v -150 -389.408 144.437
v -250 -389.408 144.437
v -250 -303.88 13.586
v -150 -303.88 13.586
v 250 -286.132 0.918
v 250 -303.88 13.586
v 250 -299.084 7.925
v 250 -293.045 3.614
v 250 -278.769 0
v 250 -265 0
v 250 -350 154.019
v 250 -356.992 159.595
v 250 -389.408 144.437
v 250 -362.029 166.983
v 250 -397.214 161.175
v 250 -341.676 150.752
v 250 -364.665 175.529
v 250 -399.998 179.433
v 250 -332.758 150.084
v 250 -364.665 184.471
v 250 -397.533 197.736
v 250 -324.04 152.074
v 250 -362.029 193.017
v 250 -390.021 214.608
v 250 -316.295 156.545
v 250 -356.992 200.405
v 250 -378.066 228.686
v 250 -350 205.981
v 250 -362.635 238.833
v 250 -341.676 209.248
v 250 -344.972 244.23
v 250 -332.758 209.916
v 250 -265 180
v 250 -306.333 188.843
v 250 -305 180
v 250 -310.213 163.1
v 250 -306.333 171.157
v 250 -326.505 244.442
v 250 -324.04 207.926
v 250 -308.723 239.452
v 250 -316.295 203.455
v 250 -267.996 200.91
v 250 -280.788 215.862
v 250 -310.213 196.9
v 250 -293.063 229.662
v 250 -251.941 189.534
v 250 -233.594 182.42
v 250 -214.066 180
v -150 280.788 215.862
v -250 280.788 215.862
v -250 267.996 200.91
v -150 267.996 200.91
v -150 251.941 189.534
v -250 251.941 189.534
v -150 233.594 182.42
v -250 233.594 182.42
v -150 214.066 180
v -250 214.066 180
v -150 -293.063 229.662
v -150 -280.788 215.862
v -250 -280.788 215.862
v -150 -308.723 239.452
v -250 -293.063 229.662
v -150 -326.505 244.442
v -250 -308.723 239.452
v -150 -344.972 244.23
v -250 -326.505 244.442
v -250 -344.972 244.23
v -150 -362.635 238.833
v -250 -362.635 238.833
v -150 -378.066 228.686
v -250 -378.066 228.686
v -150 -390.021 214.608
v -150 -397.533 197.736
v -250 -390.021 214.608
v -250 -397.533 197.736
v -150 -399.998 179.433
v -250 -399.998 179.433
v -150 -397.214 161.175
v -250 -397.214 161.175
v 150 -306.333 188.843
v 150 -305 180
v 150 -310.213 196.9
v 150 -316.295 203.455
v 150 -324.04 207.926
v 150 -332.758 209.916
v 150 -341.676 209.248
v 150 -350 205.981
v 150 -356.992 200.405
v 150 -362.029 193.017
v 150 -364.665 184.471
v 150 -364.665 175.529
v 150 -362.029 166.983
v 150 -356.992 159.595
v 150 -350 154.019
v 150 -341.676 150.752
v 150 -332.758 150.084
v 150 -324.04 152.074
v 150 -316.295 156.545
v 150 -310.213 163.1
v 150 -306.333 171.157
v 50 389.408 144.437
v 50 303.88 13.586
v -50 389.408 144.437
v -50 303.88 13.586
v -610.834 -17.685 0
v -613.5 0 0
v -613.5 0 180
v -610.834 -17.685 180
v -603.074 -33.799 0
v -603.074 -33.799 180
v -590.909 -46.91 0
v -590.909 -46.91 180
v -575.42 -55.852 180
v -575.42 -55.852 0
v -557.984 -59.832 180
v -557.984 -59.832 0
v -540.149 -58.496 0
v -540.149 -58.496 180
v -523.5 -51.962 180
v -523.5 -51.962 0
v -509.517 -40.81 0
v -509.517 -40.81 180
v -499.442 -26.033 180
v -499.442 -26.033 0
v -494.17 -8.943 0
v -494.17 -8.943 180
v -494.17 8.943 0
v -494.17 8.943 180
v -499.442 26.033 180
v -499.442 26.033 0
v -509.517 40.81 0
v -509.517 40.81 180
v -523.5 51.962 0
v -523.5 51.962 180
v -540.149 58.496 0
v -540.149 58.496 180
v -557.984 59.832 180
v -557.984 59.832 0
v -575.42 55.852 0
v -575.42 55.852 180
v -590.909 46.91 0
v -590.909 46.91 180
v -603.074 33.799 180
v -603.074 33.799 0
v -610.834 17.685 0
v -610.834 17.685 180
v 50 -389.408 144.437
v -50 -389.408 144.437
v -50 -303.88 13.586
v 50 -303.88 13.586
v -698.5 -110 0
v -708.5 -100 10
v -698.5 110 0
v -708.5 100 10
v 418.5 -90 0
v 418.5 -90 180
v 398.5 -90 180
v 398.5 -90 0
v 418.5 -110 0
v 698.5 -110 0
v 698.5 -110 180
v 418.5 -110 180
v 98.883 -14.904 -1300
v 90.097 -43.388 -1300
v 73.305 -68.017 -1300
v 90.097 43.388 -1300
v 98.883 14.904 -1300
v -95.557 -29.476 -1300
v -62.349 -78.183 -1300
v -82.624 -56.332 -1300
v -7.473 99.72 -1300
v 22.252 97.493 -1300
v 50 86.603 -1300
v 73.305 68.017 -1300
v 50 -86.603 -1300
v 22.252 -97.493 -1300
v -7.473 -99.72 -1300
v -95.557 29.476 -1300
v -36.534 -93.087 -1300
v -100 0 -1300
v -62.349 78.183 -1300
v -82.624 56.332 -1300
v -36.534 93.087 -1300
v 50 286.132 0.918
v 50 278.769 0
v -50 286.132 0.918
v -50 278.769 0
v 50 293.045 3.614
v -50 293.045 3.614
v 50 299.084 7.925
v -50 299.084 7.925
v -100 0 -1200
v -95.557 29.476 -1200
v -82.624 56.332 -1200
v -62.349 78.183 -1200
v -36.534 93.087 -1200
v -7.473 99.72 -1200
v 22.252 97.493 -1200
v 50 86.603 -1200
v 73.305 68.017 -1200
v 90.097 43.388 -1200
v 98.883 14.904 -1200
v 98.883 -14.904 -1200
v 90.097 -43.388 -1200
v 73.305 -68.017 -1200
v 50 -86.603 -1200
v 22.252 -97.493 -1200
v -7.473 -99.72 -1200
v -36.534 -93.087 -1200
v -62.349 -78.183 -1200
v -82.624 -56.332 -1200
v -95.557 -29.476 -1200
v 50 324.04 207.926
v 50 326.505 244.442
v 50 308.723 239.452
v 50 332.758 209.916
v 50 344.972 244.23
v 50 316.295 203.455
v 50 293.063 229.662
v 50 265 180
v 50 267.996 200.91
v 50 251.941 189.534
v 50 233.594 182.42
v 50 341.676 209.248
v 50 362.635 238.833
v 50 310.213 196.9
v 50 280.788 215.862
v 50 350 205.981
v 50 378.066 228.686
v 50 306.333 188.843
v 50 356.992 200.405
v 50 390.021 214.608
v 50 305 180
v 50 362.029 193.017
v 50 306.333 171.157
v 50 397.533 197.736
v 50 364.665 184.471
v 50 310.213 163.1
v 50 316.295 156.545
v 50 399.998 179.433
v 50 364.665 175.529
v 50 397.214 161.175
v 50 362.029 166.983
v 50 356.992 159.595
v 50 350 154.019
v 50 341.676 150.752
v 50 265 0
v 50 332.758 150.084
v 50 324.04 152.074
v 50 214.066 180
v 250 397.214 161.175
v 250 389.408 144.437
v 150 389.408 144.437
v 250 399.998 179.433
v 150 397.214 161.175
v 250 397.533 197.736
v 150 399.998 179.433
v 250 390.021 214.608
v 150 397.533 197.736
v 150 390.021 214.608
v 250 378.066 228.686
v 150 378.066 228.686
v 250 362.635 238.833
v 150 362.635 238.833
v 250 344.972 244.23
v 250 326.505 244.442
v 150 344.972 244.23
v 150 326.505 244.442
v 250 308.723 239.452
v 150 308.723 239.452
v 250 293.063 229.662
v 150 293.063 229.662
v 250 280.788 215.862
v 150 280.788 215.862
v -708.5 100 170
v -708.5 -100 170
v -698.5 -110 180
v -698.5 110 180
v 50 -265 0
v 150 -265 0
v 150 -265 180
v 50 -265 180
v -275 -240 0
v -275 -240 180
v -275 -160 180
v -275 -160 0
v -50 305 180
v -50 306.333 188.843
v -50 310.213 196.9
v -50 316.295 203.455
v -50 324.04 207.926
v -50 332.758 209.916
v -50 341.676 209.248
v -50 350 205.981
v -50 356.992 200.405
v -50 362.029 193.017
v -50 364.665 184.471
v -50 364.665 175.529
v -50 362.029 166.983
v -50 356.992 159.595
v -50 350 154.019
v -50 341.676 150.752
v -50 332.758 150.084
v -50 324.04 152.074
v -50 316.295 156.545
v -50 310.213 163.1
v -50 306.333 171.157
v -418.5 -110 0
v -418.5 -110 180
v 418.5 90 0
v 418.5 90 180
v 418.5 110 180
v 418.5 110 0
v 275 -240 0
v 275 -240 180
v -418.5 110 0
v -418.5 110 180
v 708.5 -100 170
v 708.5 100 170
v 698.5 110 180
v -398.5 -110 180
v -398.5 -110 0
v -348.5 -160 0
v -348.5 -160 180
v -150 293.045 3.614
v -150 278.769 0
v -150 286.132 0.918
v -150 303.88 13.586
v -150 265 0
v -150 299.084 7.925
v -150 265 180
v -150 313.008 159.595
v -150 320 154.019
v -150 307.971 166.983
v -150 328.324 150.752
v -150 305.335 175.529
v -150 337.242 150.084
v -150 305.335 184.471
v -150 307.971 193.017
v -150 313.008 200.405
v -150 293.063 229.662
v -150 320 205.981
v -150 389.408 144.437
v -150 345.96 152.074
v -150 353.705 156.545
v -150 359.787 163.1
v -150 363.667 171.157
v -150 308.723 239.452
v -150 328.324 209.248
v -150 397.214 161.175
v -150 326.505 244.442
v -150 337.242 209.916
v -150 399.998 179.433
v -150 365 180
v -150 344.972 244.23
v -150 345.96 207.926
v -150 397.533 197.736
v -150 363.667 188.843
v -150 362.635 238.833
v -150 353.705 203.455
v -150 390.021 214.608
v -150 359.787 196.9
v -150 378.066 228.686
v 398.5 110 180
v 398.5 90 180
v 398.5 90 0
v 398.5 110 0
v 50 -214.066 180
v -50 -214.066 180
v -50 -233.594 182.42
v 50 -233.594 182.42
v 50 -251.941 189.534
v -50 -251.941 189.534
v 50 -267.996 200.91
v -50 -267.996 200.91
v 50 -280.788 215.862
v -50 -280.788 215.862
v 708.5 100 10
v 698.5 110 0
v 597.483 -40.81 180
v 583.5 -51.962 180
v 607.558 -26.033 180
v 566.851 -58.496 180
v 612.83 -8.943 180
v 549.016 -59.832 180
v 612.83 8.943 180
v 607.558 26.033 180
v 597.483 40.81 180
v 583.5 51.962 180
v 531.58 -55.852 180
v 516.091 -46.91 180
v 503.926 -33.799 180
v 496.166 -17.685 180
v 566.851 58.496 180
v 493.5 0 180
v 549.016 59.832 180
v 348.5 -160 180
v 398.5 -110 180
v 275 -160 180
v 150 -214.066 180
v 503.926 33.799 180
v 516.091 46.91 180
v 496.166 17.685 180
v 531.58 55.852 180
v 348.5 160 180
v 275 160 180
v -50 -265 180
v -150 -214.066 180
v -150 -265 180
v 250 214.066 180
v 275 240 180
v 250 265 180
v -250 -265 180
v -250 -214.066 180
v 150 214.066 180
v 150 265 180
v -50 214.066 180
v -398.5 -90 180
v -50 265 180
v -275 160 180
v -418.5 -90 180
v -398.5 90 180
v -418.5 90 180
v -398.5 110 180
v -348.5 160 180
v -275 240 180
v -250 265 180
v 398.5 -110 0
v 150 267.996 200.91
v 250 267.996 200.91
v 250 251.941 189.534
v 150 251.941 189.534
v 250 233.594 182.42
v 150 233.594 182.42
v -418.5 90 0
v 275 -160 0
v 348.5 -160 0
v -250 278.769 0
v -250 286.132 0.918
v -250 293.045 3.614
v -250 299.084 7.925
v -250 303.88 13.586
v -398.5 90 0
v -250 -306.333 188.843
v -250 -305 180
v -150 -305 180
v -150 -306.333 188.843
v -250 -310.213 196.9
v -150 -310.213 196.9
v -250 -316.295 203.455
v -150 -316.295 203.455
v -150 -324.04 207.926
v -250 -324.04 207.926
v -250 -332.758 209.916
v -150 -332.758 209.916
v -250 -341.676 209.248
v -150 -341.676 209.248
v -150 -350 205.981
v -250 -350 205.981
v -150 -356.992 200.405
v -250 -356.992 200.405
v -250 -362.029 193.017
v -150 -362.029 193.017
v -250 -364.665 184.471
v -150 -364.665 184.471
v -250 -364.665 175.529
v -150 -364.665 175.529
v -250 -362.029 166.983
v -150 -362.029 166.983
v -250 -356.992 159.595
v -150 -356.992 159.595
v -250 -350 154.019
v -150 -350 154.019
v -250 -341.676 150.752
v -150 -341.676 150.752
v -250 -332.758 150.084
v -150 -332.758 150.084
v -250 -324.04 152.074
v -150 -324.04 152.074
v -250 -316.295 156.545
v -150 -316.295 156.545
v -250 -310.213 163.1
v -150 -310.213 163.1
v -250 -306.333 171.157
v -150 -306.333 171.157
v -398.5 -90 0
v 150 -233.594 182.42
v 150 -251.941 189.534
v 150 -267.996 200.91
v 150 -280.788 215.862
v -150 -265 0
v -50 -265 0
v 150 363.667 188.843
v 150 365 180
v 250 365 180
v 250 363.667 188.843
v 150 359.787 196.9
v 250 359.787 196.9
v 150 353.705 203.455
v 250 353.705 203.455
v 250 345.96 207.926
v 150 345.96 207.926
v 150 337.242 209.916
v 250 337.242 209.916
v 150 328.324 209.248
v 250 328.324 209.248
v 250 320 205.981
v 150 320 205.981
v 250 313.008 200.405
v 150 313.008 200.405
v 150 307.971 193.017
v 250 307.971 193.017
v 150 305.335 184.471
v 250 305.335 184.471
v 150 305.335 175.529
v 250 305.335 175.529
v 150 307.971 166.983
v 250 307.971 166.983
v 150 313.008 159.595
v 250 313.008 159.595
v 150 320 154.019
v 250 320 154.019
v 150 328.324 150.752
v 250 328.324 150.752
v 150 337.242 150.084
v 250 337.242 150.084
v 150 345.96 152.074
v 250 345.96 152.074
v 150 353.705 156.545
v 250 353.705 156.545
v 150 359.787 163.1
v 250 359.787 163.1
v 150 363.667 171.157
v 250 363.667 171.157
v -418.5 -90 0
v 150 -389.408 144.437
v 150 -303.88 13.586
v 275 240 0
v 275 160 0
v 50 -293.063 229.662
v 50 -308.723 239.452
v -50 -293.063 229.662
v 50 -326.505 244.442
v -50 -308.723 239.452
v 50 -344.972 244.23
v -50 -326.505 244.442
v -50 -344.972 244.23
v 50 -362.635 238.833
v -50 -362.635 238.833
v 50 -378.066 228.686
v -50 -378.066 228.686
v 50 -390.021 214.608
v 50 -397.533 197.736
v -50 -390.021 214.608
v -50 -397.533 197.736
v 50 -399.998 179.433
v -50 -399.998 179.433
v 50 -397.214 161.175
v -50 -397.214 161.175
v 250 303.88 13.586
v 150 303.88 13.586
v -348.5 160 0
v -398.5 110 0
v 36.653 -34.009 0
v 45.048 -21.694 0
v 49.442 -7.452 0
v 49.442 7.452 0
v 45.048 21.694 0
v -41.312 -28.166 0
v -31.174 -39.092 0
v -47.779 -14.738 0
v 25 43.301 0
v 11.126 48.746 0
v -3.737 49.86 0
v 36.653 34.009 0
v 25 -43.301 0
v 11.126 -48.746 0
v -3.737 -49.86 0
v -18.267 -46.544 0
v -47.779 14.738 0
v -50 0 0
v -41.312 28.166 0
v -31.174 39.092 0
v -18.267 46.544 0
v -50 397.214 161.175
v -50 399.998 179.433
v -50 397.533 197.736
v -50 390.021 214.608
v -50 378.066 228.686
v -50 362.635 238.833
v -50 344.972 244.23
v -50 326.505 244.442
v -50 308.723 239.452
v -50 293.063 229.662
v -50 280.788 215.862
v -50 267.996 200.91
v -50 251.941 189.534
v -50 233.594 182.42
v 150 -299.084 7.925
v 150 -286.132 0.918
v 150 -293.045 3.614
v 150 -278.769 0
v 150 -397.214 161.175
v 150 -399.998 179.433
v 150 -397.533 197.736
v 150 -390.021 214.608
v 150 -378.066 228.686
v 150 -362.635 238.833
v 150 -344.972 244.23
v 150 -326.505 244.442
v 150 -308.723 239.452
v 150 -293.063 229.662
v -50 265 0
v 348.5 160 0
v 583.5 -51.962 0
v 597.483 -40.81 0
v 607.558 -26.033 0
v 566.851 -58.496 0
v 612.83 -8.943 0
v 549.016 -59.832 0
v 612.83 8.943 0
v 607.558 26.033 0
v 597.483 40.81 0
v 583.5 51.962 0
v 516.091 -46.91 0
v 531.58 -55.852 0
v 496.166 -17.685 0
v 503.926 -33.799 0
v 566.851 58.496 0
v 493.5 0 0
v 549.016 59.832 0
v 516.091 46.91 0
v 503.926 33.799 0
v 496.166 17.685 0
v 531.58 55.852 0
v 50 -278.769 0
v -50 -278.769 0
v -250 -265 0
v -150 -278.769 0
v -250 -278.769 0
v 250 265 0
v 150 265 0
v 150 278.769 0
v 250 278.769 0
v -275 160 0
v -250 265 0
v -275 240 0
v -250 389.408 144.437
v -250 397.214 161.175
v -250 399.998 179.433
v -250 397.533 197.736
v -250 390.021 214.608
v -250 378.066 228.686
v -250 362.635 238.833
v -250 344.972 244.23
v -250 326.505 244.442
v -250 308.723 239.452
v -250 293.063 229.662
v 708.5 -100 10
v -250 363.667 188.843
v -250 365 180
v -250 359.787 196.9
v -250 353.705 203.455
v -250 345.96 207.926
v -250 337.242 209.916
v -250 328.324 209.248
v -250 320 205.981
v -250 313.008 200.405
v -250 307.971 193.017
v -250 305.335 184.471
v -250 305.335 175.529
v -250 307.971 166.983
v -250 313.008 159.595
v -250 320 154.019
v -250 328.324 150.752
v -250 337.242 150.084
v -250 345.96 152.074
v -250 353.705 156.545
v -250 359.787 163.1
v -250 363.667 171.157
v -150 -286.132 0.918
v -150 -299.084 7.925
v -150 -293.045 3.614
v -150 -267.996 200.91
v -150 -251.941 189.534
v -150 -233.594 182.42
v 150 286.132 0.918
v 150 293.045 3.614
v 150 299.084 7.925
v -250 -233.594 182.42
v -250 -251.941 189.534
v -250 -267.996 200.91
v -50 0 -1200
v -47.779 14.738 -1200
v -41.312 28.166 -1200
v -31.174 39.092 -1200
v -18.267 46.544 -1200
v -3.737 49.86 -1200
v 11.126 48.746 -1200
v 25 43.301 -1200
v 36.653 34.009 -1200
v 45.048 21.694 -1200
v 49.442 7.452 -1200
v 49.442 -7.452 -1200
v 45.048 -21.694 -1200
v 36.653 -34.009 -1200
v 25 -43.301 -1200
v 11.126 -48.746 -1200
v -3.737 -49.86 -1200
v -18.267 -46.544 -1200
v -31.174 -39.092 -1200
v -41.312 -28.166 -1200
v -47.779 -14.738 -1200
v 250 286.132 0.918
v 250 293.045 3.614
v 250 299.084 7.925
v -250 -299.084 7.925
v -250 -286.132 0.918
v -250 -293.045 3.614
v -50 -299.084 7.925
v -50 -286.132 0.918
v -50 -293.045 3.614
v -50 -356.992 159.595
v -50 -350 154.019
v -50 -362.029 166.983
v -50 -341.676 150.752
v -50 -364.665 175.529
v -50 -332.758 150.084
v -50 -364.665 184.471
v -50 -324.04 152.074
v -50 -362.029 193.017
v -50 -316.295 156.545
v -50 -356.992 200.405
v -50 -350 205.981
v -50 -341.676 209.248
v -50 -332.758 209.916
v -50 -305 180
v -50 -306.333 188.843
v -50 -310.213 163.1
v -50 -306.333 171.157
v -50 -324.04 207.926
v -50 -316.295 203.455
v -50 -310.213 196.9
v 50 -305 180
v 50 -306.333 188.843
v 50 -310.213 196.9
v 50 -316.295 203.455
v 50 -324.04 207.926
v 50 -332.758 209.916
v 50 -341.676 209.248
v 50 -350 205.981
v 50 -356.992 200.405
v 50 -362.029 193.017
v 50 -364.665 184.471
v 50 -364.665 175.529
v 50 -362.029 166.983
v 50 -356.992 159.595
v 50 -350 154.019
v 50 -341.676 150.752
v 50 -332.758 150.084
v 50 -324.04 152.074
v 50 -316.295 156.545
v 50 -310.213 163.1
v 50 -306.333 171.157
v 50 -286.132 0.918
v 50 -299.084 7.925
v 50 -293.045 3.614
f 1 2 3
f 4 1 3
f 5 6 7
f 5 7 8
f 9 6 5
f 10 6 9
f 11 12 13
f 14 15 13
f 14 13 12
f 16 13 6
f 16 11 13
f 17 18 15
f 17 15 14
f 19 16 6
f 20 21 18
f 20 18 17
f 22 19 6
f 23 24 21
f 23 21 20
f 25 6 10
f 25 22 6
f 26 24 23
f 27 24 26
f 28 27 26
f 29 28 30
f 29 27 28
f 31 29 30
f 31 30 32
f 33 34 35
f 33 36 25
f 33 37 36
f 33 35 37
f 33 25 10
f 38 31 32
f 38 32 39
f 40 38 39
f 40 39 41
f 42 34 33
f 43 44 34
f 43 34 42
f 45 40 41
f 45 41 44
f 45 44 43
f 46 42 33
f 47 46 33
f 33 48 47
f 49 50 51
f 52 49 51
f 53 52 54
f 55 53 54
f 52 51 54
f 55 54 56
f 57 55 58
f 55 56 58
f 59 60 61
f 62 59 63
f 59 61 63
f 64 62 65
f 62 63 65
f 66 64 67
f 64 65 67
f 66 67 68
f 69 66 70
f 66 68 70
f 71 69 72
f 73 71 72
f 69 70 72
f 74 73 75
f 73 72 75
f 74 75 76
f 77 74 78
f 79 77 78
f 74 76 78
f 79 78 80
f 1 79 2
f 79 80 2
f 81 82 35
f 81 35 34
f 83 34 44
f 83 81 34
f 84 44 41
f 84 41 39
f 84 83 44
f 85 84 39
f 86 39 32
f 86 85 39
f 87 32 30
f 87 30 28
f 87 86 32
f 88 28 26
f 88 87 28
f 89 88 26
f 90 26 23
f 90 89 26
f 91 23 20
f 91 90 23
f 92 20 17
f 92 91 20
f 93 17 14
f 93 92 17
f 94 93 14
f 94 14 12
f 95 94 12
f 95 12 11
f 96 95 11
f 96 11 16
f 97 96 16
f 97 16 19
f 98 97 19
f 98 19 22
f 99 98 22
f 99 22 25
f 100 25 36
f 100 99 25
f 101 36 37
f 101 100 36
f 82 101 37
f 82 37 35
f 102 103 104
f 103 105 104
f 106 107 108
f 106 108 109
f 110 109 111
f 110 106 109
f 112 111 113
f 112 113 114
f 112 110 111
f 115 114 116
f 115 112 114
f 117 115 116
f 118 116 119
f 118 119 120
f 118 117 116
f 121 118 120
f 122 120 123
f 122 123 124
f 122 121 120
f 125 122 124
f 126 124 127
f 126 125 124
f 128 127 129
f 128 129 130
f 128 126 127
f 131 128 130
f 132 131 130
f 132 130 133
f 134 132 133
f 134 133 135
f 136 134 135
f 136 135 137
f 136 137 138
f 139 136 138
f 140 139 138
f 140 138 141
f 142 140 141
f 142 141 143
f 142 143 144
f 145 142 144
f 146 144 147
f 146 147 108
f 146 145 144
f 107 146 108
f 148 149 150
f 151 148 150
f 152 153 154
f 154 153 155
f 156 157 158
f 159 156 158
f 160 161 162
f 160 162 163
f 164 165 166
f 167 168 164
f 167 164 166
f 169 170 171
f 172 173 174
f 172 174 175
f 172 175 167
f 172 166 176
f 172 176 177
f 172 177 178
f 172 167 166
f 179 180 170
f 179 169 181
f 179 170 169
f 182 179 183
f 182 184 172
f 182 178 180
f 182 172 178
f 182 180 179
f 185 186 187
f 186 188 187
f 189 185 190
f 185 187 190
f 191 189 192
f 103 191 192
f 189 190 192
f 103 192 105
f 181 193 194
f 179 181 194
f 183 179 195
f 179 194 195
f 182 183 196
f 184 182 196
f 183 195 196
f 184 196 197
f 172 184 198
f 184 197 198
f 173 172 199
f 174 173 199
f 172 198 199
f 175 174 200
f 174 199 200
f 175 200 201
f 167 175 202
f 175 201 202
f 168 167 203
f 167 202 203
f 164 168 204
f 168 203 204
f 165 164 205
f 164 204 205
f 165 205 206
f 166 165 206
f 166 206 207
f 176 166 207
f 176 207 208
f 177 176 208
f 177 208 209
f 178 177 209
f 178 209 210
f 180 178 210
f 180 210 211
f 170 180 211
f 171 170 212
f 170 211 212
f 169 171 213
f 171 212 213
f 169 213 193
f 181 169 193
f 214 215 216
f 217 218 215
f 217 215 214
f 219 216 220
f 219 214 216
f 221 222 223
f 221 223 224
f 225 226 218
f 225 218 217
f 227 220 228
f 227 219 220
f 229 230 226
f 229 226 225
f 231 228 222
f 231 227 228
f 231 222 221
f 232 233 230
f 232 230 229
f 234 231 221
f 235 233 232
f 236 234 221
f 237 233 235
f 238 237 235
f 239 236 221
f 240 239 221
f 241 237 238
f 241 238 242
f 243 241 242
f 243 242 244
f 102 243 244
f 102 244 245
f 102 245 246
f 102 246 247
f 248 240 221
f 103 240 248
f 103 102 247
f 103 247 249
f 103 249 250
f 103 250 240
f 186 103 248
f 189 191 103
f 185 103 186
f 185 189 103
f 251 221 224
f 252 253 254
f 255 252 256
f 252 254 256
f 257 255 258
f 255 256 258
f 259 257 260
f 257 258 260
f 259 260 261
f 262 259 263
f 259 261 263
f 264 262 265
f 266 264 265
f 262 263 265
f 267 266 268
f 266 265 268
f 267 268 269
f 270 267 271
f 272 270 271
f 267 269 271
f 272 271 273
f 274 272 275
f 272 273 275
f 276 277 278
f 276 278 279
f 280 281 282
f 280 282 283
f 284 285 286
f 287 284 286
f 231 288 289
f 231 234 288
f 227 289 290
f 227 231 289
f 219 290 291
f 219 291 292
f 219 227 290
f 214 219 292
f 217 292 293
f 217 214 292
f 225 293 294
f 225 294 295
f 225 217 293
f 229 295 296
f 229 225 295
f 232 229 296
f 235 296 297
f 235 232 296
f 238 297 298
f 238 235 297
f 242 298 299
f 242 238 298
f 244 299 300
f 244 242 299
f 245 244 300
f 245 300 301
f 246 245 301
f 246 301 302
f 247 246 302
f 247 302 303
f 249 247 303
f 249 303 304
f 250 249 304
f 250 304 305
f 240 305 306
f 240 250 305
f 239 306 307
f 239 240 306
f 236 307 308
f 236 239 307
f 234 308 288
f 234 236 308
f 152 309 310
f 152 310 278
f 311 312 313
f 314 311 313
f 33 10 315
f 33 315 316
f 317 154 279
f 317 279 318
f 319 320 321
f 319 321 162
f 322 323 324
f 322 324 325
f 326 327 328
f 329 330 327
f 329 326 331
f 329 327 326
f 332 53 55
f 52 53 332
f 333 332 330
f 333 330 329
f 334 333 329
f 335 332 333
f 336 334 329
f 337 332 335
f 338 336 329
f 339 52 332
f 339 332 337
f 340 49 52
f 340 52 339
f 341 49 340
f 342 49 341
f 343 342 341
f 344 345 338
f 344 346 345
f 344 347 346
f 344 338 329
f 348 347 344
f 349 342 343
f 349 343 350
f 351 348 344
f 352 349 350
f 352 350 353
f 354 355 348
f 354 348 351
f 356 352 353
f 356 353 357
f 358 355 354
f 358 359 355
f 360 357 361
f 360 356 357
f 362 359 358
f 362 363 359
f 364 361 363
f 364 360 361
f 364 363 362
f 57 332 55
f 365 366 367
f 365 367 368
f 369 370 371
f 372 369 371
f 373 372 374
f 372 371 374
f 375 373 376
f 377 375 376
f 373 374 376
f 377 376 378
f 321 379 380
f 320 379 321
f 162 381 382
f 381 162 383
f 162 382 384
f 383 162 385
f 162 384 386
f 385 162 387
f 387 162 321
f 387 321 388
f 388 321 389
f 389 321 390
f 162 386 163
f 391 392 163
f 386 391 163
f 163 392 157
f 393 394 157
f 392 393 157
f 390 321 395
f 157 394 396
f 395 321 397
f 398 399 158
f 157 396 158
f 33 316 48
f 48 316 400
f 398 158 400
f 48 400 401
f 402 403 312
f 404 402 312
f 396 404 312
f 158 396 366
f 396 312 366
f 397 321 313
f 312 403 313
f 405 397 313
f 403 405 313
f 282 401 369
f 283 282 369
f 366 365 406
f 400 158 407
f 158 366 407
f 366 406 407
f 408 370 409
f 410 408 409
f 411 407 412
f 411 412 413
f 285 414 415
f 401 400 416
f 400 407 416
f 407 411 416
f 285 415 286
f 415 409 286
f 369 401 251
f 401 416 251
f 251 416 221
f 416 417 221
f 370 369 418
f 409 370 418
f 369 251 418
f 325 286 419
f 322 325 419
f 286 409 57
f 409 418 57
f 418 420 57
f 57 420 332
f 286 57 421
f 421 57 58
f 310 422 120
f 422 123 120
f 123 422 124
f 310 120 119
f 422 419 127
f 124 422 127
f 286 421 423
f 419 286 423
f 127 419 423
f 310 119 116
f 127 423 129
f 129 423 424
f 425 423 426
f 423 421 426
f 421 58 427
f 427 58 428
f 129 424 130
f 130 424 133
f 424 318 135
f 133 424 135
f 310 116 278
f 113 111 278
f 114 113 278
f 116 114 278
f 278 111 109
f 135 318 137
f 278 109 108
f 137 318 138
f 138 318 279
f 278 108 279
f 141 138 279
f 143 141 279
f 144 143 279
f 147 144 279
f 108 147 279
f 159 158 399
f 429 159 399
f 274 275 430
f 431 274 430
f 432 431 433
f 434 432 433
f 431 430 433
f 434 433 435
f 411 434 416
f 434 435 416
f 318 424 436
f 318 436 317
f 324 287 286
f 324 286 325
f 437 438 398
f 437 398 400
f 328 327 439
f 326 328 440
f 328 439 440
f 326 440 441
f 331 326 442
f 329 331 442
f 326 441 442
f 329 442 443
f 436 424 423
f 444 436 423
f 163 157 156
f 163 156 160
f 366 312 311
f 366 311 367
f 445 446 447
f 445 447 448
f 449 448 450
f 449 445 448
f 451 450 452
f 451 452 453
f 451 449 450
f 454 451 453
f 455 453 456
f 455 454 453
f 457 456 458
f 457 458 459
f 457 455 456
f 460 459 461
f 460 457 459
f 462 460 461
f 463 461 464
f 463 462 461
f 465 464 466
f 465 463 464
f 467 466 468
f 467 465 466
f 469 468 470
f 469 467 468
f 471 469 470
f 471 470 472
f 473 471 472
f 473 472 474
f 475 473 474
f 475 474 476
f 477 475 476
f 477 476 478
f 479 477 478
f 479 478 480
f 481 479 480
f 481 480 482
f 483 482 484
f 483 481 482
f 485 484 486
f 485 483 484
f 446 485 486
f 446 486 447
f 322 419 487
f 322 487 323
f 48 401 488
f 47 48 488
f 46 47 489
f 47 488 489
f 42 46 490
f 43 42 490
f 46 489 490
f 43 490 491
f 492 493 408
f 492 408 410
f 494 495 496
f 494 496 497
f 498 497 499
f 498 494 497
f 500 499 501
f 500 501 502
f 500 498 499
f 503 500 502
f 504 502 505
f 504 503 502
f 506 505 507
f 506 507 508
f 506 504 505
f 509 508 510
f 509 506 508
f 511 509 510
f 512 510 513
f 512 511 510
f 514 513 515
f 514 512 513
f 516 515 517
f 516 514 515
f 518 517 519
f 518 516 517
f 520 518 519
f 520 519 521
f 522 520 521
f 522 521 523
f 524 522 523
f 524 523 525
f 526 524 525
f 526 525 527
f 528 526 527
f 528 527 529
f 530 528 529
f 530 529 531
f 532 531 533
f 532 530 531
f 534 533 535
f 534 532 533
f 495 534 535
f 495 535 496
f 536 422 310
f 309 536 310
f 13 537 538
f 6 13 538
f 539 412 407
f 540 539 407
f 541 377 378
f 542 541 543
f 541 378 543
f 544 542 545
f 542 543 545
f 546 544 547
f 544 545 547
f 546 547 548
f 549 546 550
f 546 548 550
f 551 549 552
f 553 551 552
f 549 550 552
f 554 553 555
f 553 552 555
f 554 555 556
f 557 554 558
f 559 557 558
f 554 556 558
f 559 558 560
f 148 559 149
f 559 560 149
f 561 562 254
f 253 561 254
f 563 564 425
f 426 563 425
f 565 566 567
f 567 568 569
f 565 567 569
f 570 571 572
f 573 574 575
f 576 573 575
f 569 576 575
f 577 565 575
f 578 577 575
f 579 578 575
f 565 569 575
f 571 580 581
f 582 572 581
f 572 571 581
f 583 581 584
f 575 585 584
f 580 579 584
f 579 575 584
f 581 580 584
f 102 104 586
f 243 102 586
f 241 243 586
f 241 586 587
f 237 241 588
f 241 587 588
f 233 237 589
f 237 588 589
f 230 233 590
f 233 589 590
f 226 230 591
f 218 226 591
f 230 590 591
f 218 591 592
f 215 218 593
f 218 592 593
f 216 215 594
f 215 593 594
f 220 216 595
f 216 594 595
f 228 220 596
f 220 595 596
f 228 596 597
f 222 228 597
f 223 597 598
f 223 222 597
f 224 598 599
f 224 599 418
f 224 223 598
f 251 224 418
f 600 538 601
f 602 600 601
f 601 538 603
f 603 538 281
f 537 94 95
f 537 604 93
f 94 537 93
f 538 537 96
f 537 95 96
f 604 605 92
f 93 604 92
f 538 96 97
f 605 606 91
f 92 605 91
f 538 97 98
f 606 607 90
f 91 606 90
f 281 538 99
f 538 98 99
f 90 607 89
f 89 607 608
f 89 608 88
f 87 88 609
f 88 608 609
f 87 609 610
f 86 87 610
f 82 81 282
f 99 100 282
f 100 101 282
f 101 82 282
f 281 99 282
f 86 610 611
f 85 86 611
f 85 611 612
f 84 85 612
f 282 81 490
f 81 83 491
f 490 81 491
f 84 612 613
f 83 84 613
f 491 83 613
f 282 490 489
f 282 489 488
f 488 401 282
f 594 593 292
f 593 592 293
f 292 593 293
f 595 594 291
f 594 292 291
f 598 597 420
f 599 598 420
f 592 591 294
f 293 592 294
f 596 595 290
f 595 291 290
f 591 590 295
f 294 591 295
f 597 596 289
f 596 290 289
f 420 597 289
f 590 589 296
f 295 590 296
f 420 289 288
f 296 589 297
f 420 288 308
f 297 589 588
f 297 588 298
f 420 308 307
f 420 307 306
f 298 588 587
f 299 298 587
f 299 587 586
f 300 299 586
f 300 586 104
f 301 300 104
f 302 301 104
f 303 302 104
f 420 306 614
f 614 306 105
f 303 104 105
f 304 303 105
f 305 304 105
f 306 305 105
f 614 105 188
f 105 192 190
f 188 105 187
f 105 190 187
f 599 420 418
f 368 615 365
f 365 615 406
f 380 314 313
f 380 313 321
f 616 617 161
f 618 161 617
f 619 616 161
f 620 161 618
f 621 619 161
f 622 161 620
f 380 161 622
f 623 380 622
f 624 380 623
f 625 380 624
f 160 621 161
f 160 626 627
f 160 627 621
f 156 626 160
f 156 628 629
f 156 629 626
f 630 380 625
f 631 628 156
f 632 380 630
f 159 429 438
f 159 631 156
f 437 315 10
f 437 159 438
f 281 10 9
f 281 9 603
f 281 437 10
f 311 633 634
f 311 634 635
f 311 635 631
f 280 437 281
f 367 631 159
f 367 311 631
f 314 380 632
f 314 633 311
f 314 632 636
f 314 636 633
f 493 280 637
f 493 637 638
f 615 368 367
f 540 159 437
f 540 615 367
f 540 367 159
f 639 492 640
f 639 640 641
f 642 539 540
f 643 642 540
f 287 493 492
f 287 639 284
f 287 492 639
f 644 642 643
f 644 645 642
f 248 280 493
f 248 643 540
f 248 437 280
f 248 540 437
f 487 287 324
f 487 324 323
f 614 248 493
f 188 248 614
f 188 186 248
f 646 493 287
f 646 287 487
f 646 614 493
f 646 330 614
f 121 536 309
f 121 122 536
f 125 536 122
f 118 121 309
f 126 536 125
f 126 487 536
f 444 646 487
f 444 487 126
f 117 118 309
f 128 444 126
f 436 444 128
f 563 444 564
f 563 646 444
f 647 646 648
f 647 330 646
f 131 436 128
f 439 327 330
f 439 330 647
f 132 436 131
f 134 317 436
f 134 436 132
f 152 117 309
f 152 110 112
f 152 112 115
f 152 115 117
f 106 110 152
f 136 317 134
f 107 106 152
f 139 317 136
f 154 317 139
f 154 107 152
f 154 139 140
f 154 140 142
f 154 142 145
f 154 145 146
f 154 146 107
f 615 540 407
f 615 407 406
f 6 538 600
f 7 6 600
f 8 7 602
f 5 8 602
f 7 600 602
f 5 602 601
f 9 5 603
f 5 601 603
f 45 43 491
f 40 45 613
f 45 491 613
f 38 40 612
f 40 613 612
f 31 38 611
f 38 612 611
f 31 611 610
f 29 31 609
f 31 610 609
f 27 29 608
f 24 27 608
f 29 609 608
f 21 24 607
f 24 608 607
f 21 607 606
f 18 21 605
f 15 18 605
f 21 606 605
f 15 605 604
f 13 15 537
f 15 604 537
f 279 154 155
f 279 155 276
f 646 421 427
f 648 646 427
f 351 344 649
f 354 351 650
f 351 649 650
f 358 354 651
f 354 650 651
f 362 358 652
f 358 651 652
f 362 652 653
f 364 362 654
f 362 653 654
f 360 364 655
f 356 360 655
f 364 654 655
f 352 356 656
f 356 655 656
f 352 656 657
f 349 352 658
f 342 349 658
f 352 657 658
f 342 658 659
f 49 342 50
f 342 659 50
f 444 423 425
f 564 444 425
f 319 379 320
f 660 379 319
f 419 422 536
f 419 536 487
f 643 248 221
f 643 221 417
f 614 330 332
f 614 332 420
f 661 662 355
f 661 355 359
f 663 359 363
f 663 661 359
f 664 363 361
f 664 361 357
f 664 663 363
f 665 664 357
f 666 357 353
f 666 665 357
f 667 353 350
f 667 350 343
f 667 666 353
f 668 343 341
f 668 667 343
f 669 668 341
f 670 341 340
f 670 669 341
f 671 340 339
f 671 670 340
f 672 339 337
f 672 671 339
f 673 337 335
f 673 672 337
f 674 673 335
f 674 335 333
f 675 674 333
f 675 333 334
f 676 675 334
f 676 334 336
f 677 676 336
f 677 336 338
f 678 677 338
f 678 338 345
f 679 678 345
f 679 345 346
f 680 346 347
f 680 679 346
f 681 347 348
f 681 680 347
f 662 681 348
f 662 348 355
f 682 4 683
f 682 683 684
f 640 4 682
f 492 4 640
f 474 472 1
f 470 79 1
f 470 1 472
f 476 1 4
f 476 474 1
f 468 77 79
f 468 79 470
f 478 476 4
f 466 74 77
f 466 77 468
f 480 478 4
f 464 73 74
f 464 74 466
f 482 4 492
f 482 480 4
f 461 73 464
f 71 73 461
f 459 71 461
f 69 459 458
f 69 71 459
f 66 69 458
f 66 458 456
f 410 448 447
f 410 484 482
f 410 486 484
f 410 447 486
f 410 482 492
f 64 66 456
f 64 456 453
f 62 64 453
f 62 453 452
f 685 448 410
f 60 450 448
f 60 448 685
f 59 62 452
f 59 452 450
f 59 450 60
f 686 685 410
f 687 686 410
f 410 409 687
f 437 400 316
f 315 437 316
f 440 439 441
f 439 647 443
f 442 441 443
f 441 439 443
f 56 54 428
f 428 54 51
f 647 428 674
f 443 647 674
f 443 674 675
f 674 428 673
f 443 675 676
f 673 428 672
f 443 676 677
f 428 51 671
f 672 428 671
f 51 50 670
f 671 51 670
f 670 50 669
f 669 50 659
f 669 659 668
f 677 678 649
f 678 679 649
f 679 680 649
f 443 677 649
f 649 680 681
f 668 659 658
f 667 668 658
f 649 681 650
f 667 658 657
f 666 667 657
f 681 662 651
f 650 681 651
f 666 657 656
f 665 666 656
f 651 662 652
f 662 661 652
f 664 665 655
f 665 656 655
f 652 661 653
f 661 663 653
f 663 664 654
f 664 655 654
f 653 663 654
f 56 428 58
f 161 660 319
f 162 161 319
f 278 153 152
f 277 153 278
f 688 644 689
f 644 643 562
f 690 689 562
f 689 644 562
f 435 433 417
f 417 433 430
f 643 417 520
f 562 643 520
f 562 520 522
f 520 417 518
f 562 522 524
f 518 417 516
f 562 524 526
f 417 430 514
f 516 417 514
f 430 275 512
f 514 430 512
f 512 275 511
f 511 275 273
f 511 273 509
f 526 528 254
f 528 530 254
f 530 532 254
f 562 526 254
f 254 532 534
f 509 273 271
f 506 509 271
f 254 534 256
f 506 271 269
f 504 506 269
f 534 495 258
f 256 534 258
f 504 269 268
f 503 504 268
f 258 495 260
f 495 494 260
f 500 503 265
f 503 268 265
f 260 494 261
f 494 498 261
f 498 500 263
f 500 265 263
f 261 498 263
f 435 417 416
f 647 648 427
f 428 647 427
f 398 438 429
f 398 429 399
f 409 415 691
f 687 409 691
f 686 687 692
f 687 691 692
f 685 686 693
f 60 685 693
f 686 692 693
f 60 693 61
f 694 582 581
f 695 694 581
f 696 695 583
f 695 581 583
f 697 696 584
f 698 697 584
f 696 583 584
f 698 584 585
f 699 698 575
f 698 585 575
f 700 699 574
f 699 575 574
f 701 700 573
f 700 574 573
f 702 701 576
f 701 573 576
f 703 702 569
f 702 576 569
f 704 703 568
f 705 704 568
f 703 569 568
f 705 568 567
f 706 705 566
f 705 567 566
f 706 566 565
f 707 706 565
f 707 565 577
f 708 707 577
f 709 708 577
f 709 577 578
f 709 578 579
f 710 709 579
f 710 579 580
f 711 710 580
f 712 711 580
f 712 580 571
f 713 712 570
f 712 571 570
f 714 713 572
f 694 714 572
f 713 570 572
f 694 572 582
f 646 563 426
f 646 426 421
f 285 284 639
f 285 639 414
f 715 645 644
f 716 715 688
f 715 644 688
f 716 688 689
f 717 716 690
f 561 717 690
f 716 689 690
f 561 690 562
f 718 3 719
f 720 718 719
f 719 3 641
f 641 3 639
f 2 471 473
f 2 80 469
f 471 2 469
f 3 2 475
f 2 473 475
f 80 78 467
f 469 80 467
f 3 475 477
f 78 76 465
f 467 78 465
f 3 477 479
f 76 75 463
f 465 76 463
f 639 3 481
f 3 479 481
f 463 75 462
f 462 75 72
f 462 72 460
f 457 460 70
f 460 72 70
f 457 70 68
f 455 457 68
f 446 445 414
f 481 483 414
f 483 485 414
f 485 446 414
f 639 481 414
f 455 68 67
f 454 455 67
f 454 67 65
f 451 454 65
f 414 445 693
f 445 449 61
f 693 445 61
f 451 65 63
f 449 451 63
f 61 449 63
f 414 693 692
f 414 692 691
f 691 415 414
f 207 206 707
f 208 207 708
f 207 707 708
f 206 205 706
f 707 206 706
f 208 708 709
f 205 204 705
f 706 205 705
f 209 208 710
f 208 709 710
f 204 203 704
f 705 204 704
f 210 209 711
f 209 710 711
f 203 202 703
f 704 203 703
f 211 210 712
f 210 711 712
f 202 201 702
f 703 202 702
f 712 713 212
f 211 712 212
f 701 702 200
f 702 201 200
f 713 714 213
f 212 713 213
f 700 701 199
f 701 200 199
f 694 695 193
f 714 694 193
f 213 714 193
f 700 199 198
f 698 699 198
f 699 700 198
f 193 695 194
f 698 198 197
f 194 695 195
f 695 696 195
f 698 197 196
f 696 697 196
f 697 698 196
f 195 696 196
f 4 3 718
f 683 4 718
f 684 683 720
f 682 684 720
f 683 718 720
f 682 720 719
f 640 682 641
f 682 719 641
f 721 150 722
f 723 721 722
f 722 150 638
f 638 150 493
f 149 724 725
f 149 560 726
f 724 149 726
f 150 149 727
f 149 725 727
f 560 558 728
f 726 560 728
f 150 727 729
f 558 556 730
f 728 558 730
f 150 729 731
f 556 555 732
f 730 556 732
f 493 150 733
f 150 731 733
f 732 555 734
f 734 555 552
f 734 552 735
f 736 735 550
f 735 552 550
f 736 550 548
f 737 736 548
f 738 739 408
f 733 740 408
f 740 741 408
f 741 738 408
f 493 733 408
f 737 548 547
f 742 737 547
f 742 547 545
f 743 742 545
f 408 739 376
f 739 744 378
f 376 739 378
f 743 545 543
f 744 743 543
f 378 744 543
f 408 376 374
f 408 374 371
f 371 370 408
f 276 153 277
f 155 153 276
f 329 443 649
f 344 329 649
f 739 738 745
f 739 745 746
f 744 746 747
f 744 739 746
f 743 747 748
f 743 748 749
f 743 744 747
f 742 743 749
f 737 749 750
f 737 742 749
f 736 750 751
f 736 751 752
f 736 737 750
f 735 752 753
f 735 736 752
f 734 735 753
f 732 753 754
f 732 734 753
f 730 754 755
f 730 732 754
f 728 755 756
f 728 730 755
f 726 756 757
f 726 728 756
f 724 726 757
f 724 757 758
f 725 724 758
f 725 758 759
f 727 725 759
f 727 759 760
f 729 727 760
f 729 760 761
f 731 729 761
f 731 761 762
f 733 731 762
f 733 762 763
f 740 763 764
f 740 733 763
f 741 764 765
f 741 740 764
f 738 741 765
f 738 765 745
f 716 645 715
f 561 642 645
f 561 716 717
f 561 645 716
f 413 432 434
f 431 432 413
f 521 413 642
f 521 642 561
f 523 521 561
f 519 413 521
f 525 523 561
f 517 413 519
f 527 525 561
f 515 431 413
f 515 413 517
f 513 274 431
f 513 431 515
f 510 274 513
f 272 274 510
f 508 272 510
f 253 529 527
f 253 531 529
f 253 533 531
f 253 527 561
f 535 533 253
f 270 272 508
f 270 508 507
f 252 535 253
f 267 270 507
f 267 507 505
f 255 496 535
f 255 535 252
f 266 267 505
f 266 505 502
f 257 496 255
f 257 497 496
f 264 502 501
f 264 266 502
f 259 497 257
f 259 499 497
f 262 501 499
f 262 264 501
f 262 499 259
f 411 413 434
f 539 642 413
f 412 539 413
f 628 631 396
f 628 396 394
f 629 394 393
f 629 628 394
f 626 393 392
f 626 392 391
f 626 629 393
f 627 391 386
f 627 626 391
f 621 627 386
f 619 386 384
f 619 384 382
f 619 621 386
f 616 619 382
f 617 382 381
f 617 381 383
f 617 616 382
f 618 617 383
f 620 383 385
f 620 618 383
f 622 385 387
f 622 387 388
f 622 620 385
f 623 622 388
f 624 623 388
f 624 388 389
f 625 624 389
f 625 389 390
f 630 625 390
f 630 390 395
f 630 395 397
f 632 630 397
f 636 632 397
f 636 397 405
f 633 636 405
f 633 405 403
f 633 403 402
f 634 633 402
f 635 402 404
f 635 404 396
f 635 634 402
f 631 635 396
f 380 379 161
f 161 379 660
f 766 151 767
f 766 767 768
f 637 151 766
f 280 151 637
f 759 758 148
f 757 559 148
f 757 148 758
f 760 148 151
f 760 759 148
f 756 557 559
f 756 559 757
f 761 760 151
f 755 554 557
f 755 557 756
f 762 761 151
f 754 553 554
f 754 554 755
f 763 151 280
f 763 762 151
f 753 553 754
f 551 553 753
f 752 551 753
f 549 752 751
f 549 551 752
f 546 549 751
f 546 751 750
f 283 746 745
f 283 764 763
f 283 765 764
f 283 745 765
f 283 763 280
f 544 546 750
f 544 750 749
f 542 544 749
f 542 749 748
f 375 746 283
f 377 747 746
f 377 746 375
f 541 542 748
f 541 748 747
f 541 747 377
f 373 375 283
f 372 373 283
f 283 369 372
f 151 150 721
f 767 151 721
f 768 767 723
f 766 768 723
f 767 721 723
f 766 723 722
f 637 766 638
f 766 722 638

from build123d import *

# Parameters (mm, degrees)
SKETCH1_R               = 60
BOSS_EXTRUDE1_DEPTH     = 180
SKETCH3_R               = 30
BOSS_EXTRUDE2_DEPTH     = 50
CHAMFER5_SIZE           = 50
CHAMFER6_SIZE           = 10
FILLET1_R               = 30
FILLET2_R               = 80
LPATTERN4_START         = -250
LPATTERN4_OUTLINE_R     = 30
LPATTERN4_DEPTH         = 100
LPATTERN4_START_2       = 150
LPATTERN4_2_OUTLINE_R   = 30
LPATTERN4_2_DEPTH       = 100
MIRROR1_START           = -250
MIRROR1_OUTLINE_R       = 30
MIRROR1_DEPTH           = 100
MIRROR1_START_2         = -50
MIRROR1_2_OUTLINE_R     = 30
MIRROR1_2_DEPTH         = 100
MIRROR1_START_3         = 150
MIRROR1_3_OUTLINE_R     = 30
MIRROR1_3_DEPTH         = 100
SKETCH4_W               = 20
SKETCH4_H               = 20
CUT_EXTRUDE1_DEPTH      = 308
MIRROR3_COPY_1_SKETCH_W = 20
MIRROR3_COPY_1_SKETCH_H = 20
MIRROR3_COPY_1_DEPTH    = 308
CHAMFER7_SIZE           = 25
CHAMFER8_SIZE           = 25
SKETCH5_R               = 50
BOSS_EXTRUDE3_DEPTH     = 1200
SKETCH6_R               = 100
BOSS_EXTRUDE4_DEPTH     = 100


# Read off the part's stored shape, not the designer's step: LPattern4, Mirror1
# Some blends are built 0.0001 mm under size
with BuildPart() as part:
    # Sketch1 → Boss-Extrude1 (new body)
    with BuildSketch(Plane.XY):
        Polygon((398.5, 110), (708.5, 110), (708.5, -110), (398.5, -110), (398.5, -160), (275, -160), (275, -265), (-275, -265), (-275, -160), (-398.5, -160), (-398.5, -110), (-708.5, -110), (-708.5, 110), (-398.5, 110), (-398.5, 160), (-275, 160), (-275, 265), (275, 265), (275, 160), (398.5, 160), align=None)
        with Locations(Location((553.5, 0, 0), (0, 0, 180))):
            Circle(SKETCH1_R, mode=Mode.SUBTRACT)
        with Locations(Location((-553.5, 0, 0), (0, 0, 180))):
            Circle(SKETCH1_R, mode=Mode.SUBTRACT)
    extrude(amount=BOSS_EXTRUDE1_DEPTH)

    # Sketch3 → Boss-Extrude2 (add, symmetric)
    with BuildSketch(Plane.ZY):
        with BuildLine():
            Line((0, 295), (144.437021115, 389.408404983))
            ThreePointArc((144.437021115, 389.408404983), (237.667058368, 364.991838543), (204.124993391, 274.642857143))
            Line((204.124993391, 274.642857143), (180, 265))
            Line((180, 265), (0, 265))
            Line((0, 265), (0, 295))
        make_face()
        with Locations(Location((180, 335, 0), (0, 0, 270))):
            Circle(SKETCH3_R, mode=Mode.SUBTRACT)
    extrude(amount=BOSS_EXTRUDE2_DEPTH, both=True)

    # Chamfer5
    chamfer5_edges = [part.edges().sort_by_distance(p)[0] for p in [
        (-398.5, -160, 90),
        (-398.5, 160, 90),
        (398.5, -160, 90),
        (398.5, 160, 90),
    ]]
    chamfer(chamfer5_edges, length=CHAMFER5_SIZE - 0.0001)  # a hair under: the kernel refuses the full size

    # Chamfer6
    chamfer6_edges = [part.edges().sort_by_distance(p)[0] for p in [
        (-708.5, 0, 0),
        (708.5, 0, 0),
        (708.5, -110, 90),
        (-708.5, -110, 90),
        (-708.5, 110, 90),
        (708.5, 110, 90),
        (-708.5, 0, 180),
        (708.5, 0, 180),
    ]]
    chamfer(chamfer6_edges, length=CHAMFER6_SIZE)

    # Fillet1
    fillet1_edges = [part.edges().sort_by_distance(p)[0] for p in [
        (0, 295, 0),
    ]]
    fillet(fillet1_edges, radius=FILLET1_R)

    # Fillet2
    # the kernel refuses this fillet: 80 mm, written as the material it adds along each edge
    with BuildSketch(Plane(origin=(50, 265, 180), x_dir=(0, 0.40293010852781525, 0.9152307510359139), z_dir=(-1, 0, 0))) as fillet2_piece_1:
        with BuildLine():
            CenterArc((52.695671837, -78.85064932), FILLET2_R, 99.723894653, 56.514623377)
            Line((-20.522788246, -46.616240638), (-27.844634254, -43.39279977))
            Line((-27.844634254, -43.39279977), (-7.321846008, 3.223440868))
            Line((-7.321846008, 3.223440868), (0.275664529, 7.995249156))
            ThreePointArc((0.275664529, 7.995249156), (26.240997825, 7.100002336), (37.83243285, 7.885064932))
            Line((37.83243285, 7.885064932), (39.183636394, 0))
        make_face()
    extrude(amount=100)

    # LPattern4 outline → LPattern4 (add)
    with BuildSketch(Plane.YZ.offset(LPATTERN4_START)):
        with BuildLine():
            ThreePointArc((389.408404983, 144.437021115), (370.712659311, 234.310274948), (280.788266865, 215.862068966))
            ThreePointArc((280.788266865, 215.862068966), (251.940699894, 189.533573658), (214.066133776, 180))
            Line((214.066133776, 180), (265, 180))
            Line((265, 180), (265, 0))
            Line((265, 0), (278.768856416, 0))
            ThreePointArc((278.768856416, 0), (293.044526683, 3.614298599), (303.880427947, 13.586317438))
            Line((303.880427947, 13.586317438), (389.408404983, 144.437021115))
        make_face()
        with Locations((335, 180)):
            Circle(LPATTERN4_OUTLINE_R, mode=Mode.SUBTRACT)
    extrude(amount=LPATTERN4_DEPTH)

    # LPattern4 2 outline → LPattern4 2 (add)
    with BuildSketch(Plane.YZ.offset(LPATTERN4_START_2)):
        with BuildLine():
            ThreePointArc((389.408404983, 144.437021115), (370.712659311, 234.310274948), (280.788266865, 215.862068966))
            ThreePointArc((280.788266865, 215.862068966), (251.940699894, 189.533573658), (214.066133776, 180))
            Line((214.066133776, 180), (265, 180))
            Line((265, 180), (265, 0))
            Line((265, 0), (278.768856416, 0))
            ThreePointArc((278.768856416, 0), (293.044526683, 3.614298599), (303.880427947, 13.586317438))
            Line((303.880427947, 13.586317438), (389.408404983, 144.437021115))
        make_face()
        with Locations((335, 180)):
            Circle(LPATTERN4_2_OUTLINE_R, mode=Mode.SUBTRACT)
    extrude(amount=LPATTERN4_2_DEPTH)

    # Mirror1 outline → Mirror1 (add)
    with BuildSketch(Plane.YZ.offset(MIRROR1_START)):
        with BuildLine():
            ThreePointArc((-280.788266865, 215.862068966), (-370.712659311, 234.310274948), (-389.408404983, 144.437021115))
            Line((-389.408404983, 144.437021115), (-303.880427947, 13.586317438))
            ThreePointArc((-303.880427947, 13.586317438), (-293.044526683, 3.614298599), (-278.768856416, 0))
            Line((-278.768856416, 0), (-265, 0))
            Line((-265, 0), (-265, 180))
            Line((-265, 180), (-214.066133776, 180))
            ThreePointArc((-214.066133776, 180), (-251.940699894, 189.533573658), (-280.788266865, 215.862068966))
        make_face()
        with Locations((-335, 180)):
            Circle(MIRROR1_OUTLINE_R, mode=Mode.SUBTRACT)
    extrude(amount=MIRROR1_DEPTH)

    # Mirror1 2 outline → Mirror1 2 (add)
    with BuildSketch(Plane.YZ.offset(MIRROR1_START_2)):
        with BuildLine():
            ThreePointArc((-280.788266865, 215.862068966), (-370.712659311, 234.310274948), (-389.408404983, 144.437021115))
            Line((-389.408404983, 144.437021115), (-303.880427947, 13.586317438))
            ThreePointArc((-303.880427947, 13.586317438), (-293.044526683, 3.614298599), (-278.768856416, 0))
            Line((-278.768856416, 0), (-265, 0))
            Line((-265, 0), (-265, 180))
            Line((-265, 180), (-214.066133776, 180))
            ThreePointArc((-214.066133776, 180), (-251.940699894, 189.533573658), (-280.788266865, 215.862068966))
        make_face()
        with Locations((-335, 180)):
            Circle(MIRROR1_2_OUTLINE_R, mode=Mode.SUBTRACT)
    extrude(amount=MIRROR1_2_DEPTH)

    # Mirror1 3 outline → Mirror1 3 (add)
    with BuildSketch(Plane.YZ.offset(MIRROR1_START_3)):
        with BuildLine():
            ThreePointArc((-280.788266865, 215.862068966), (-370.712659311, 234.310274948), (-389.408404983, 144.437021115))
            Line((-389.408404983, 144.437021115), (-303.880427947, 13.586317438))
            ThreePointArc((-303.880427947, 13.586317438), (-293.044526683, 3.614298599), (-278.768856416, 0))
            Line((-278.768856416, 0), (-265, 0))
            Line((-265, 0), (-265, 180))
            Line((-265, 180), (-214.066133776, 180))
            ThreePointArc((-214.066133776, 180), (-251.940699894, 189.533573658), (-280.788266865, 215.862068966))
        make_face()
        with Locations((-335, 180)):
            Circle(MIRROR1_3_OUTLINE_R, mode=Mode.SUBTRACT)
    extrude(amount=MIRROR1_3_DEPTH)

    # Sketch4 → Cut-Extrude1 (cut)
    with BuildSketch(Plane.XY.offset(180)):
        with Locations((-408.5, 100)):
            Rectangle(SKETCH4_W, SKETCH4_H)
    cut_extrude1 = extrude(amount=-CUT_EXTRUDE1_DEPTH, mode=Mode.SUBTRACT)

    # Mirror2: Cut-Extrude1 across plane
    add(cut_extrude1.mirror(Plane.ZX), mode=Mode.SUBTRACT)

    # Mirror3: Cut-Extrude1 across plane
    add(cut_extrude1.mirror(Plane.ZY), mode=Mode.SUBTRACT)

    # Mirror3 copy 1 sketch → Mirror3 copy 1 (cut)
    with BuildSketch(Plane(origin=(0, 0, 180), x_dir=(-1, 0, 0), z_dir=(0, 0, 1))):
        with Locations((-408.5, 100)):
            Rectangle(MIRROR3_COPY_1_SKETCH_W, MIRROR3_COPY_1_SKETCH_H)
    extrude(amount=-MIRROR3_COPY_1_DEPTH, mode=Mode.SUBTRACT)

    # Chamfer7
    chamfer7_edges = [part.edges().sort_by_distance(p)[0] for p in [
        (275, 265, 90),
        (-275, 265, 90),
    ]]
    chamfer(chamfer7_edges, length=CHAMFER7_SIZE - 0.0001)  # a hair under: the kernel refuses the full size

    # Chamfer8
    chamfer8_edges = [part.edges().sort_by_distance(p)[0] for p in [
        (-275, -265, 90),
        (275, -265, 90),
    ]]
    chamfer(chamfer8_edges, length=CHAMFER8_SIZE - 0.0001)  # a hair under: the kernel refuses the full size


with BuildPart() as body_2:
    # Sketch5 → Boss-Extrude3 (new body)
    with BuildSketch(Plane(origin=(0, 0, 0), x_dir=(-1, 0, 0), z_dir=(0, 0, -1))):
        Circle(SKETCH5_R)
    extrude(amount=BOSS_EXTRUDE3_DEPTH)

    # Sketch6 → Boss-Extrude4 (add)
    with BuildSketch(Plane(origin=(0, 0, -1200), x_dir=(-1, 0, 0), z_dir=(0, 0, -1))):
        Circle(SKETCH6_R)
    extrude(amount=BOSS_EXTRUDE4_DEPTH)


solid = Compound([part.part, body_2.part])
